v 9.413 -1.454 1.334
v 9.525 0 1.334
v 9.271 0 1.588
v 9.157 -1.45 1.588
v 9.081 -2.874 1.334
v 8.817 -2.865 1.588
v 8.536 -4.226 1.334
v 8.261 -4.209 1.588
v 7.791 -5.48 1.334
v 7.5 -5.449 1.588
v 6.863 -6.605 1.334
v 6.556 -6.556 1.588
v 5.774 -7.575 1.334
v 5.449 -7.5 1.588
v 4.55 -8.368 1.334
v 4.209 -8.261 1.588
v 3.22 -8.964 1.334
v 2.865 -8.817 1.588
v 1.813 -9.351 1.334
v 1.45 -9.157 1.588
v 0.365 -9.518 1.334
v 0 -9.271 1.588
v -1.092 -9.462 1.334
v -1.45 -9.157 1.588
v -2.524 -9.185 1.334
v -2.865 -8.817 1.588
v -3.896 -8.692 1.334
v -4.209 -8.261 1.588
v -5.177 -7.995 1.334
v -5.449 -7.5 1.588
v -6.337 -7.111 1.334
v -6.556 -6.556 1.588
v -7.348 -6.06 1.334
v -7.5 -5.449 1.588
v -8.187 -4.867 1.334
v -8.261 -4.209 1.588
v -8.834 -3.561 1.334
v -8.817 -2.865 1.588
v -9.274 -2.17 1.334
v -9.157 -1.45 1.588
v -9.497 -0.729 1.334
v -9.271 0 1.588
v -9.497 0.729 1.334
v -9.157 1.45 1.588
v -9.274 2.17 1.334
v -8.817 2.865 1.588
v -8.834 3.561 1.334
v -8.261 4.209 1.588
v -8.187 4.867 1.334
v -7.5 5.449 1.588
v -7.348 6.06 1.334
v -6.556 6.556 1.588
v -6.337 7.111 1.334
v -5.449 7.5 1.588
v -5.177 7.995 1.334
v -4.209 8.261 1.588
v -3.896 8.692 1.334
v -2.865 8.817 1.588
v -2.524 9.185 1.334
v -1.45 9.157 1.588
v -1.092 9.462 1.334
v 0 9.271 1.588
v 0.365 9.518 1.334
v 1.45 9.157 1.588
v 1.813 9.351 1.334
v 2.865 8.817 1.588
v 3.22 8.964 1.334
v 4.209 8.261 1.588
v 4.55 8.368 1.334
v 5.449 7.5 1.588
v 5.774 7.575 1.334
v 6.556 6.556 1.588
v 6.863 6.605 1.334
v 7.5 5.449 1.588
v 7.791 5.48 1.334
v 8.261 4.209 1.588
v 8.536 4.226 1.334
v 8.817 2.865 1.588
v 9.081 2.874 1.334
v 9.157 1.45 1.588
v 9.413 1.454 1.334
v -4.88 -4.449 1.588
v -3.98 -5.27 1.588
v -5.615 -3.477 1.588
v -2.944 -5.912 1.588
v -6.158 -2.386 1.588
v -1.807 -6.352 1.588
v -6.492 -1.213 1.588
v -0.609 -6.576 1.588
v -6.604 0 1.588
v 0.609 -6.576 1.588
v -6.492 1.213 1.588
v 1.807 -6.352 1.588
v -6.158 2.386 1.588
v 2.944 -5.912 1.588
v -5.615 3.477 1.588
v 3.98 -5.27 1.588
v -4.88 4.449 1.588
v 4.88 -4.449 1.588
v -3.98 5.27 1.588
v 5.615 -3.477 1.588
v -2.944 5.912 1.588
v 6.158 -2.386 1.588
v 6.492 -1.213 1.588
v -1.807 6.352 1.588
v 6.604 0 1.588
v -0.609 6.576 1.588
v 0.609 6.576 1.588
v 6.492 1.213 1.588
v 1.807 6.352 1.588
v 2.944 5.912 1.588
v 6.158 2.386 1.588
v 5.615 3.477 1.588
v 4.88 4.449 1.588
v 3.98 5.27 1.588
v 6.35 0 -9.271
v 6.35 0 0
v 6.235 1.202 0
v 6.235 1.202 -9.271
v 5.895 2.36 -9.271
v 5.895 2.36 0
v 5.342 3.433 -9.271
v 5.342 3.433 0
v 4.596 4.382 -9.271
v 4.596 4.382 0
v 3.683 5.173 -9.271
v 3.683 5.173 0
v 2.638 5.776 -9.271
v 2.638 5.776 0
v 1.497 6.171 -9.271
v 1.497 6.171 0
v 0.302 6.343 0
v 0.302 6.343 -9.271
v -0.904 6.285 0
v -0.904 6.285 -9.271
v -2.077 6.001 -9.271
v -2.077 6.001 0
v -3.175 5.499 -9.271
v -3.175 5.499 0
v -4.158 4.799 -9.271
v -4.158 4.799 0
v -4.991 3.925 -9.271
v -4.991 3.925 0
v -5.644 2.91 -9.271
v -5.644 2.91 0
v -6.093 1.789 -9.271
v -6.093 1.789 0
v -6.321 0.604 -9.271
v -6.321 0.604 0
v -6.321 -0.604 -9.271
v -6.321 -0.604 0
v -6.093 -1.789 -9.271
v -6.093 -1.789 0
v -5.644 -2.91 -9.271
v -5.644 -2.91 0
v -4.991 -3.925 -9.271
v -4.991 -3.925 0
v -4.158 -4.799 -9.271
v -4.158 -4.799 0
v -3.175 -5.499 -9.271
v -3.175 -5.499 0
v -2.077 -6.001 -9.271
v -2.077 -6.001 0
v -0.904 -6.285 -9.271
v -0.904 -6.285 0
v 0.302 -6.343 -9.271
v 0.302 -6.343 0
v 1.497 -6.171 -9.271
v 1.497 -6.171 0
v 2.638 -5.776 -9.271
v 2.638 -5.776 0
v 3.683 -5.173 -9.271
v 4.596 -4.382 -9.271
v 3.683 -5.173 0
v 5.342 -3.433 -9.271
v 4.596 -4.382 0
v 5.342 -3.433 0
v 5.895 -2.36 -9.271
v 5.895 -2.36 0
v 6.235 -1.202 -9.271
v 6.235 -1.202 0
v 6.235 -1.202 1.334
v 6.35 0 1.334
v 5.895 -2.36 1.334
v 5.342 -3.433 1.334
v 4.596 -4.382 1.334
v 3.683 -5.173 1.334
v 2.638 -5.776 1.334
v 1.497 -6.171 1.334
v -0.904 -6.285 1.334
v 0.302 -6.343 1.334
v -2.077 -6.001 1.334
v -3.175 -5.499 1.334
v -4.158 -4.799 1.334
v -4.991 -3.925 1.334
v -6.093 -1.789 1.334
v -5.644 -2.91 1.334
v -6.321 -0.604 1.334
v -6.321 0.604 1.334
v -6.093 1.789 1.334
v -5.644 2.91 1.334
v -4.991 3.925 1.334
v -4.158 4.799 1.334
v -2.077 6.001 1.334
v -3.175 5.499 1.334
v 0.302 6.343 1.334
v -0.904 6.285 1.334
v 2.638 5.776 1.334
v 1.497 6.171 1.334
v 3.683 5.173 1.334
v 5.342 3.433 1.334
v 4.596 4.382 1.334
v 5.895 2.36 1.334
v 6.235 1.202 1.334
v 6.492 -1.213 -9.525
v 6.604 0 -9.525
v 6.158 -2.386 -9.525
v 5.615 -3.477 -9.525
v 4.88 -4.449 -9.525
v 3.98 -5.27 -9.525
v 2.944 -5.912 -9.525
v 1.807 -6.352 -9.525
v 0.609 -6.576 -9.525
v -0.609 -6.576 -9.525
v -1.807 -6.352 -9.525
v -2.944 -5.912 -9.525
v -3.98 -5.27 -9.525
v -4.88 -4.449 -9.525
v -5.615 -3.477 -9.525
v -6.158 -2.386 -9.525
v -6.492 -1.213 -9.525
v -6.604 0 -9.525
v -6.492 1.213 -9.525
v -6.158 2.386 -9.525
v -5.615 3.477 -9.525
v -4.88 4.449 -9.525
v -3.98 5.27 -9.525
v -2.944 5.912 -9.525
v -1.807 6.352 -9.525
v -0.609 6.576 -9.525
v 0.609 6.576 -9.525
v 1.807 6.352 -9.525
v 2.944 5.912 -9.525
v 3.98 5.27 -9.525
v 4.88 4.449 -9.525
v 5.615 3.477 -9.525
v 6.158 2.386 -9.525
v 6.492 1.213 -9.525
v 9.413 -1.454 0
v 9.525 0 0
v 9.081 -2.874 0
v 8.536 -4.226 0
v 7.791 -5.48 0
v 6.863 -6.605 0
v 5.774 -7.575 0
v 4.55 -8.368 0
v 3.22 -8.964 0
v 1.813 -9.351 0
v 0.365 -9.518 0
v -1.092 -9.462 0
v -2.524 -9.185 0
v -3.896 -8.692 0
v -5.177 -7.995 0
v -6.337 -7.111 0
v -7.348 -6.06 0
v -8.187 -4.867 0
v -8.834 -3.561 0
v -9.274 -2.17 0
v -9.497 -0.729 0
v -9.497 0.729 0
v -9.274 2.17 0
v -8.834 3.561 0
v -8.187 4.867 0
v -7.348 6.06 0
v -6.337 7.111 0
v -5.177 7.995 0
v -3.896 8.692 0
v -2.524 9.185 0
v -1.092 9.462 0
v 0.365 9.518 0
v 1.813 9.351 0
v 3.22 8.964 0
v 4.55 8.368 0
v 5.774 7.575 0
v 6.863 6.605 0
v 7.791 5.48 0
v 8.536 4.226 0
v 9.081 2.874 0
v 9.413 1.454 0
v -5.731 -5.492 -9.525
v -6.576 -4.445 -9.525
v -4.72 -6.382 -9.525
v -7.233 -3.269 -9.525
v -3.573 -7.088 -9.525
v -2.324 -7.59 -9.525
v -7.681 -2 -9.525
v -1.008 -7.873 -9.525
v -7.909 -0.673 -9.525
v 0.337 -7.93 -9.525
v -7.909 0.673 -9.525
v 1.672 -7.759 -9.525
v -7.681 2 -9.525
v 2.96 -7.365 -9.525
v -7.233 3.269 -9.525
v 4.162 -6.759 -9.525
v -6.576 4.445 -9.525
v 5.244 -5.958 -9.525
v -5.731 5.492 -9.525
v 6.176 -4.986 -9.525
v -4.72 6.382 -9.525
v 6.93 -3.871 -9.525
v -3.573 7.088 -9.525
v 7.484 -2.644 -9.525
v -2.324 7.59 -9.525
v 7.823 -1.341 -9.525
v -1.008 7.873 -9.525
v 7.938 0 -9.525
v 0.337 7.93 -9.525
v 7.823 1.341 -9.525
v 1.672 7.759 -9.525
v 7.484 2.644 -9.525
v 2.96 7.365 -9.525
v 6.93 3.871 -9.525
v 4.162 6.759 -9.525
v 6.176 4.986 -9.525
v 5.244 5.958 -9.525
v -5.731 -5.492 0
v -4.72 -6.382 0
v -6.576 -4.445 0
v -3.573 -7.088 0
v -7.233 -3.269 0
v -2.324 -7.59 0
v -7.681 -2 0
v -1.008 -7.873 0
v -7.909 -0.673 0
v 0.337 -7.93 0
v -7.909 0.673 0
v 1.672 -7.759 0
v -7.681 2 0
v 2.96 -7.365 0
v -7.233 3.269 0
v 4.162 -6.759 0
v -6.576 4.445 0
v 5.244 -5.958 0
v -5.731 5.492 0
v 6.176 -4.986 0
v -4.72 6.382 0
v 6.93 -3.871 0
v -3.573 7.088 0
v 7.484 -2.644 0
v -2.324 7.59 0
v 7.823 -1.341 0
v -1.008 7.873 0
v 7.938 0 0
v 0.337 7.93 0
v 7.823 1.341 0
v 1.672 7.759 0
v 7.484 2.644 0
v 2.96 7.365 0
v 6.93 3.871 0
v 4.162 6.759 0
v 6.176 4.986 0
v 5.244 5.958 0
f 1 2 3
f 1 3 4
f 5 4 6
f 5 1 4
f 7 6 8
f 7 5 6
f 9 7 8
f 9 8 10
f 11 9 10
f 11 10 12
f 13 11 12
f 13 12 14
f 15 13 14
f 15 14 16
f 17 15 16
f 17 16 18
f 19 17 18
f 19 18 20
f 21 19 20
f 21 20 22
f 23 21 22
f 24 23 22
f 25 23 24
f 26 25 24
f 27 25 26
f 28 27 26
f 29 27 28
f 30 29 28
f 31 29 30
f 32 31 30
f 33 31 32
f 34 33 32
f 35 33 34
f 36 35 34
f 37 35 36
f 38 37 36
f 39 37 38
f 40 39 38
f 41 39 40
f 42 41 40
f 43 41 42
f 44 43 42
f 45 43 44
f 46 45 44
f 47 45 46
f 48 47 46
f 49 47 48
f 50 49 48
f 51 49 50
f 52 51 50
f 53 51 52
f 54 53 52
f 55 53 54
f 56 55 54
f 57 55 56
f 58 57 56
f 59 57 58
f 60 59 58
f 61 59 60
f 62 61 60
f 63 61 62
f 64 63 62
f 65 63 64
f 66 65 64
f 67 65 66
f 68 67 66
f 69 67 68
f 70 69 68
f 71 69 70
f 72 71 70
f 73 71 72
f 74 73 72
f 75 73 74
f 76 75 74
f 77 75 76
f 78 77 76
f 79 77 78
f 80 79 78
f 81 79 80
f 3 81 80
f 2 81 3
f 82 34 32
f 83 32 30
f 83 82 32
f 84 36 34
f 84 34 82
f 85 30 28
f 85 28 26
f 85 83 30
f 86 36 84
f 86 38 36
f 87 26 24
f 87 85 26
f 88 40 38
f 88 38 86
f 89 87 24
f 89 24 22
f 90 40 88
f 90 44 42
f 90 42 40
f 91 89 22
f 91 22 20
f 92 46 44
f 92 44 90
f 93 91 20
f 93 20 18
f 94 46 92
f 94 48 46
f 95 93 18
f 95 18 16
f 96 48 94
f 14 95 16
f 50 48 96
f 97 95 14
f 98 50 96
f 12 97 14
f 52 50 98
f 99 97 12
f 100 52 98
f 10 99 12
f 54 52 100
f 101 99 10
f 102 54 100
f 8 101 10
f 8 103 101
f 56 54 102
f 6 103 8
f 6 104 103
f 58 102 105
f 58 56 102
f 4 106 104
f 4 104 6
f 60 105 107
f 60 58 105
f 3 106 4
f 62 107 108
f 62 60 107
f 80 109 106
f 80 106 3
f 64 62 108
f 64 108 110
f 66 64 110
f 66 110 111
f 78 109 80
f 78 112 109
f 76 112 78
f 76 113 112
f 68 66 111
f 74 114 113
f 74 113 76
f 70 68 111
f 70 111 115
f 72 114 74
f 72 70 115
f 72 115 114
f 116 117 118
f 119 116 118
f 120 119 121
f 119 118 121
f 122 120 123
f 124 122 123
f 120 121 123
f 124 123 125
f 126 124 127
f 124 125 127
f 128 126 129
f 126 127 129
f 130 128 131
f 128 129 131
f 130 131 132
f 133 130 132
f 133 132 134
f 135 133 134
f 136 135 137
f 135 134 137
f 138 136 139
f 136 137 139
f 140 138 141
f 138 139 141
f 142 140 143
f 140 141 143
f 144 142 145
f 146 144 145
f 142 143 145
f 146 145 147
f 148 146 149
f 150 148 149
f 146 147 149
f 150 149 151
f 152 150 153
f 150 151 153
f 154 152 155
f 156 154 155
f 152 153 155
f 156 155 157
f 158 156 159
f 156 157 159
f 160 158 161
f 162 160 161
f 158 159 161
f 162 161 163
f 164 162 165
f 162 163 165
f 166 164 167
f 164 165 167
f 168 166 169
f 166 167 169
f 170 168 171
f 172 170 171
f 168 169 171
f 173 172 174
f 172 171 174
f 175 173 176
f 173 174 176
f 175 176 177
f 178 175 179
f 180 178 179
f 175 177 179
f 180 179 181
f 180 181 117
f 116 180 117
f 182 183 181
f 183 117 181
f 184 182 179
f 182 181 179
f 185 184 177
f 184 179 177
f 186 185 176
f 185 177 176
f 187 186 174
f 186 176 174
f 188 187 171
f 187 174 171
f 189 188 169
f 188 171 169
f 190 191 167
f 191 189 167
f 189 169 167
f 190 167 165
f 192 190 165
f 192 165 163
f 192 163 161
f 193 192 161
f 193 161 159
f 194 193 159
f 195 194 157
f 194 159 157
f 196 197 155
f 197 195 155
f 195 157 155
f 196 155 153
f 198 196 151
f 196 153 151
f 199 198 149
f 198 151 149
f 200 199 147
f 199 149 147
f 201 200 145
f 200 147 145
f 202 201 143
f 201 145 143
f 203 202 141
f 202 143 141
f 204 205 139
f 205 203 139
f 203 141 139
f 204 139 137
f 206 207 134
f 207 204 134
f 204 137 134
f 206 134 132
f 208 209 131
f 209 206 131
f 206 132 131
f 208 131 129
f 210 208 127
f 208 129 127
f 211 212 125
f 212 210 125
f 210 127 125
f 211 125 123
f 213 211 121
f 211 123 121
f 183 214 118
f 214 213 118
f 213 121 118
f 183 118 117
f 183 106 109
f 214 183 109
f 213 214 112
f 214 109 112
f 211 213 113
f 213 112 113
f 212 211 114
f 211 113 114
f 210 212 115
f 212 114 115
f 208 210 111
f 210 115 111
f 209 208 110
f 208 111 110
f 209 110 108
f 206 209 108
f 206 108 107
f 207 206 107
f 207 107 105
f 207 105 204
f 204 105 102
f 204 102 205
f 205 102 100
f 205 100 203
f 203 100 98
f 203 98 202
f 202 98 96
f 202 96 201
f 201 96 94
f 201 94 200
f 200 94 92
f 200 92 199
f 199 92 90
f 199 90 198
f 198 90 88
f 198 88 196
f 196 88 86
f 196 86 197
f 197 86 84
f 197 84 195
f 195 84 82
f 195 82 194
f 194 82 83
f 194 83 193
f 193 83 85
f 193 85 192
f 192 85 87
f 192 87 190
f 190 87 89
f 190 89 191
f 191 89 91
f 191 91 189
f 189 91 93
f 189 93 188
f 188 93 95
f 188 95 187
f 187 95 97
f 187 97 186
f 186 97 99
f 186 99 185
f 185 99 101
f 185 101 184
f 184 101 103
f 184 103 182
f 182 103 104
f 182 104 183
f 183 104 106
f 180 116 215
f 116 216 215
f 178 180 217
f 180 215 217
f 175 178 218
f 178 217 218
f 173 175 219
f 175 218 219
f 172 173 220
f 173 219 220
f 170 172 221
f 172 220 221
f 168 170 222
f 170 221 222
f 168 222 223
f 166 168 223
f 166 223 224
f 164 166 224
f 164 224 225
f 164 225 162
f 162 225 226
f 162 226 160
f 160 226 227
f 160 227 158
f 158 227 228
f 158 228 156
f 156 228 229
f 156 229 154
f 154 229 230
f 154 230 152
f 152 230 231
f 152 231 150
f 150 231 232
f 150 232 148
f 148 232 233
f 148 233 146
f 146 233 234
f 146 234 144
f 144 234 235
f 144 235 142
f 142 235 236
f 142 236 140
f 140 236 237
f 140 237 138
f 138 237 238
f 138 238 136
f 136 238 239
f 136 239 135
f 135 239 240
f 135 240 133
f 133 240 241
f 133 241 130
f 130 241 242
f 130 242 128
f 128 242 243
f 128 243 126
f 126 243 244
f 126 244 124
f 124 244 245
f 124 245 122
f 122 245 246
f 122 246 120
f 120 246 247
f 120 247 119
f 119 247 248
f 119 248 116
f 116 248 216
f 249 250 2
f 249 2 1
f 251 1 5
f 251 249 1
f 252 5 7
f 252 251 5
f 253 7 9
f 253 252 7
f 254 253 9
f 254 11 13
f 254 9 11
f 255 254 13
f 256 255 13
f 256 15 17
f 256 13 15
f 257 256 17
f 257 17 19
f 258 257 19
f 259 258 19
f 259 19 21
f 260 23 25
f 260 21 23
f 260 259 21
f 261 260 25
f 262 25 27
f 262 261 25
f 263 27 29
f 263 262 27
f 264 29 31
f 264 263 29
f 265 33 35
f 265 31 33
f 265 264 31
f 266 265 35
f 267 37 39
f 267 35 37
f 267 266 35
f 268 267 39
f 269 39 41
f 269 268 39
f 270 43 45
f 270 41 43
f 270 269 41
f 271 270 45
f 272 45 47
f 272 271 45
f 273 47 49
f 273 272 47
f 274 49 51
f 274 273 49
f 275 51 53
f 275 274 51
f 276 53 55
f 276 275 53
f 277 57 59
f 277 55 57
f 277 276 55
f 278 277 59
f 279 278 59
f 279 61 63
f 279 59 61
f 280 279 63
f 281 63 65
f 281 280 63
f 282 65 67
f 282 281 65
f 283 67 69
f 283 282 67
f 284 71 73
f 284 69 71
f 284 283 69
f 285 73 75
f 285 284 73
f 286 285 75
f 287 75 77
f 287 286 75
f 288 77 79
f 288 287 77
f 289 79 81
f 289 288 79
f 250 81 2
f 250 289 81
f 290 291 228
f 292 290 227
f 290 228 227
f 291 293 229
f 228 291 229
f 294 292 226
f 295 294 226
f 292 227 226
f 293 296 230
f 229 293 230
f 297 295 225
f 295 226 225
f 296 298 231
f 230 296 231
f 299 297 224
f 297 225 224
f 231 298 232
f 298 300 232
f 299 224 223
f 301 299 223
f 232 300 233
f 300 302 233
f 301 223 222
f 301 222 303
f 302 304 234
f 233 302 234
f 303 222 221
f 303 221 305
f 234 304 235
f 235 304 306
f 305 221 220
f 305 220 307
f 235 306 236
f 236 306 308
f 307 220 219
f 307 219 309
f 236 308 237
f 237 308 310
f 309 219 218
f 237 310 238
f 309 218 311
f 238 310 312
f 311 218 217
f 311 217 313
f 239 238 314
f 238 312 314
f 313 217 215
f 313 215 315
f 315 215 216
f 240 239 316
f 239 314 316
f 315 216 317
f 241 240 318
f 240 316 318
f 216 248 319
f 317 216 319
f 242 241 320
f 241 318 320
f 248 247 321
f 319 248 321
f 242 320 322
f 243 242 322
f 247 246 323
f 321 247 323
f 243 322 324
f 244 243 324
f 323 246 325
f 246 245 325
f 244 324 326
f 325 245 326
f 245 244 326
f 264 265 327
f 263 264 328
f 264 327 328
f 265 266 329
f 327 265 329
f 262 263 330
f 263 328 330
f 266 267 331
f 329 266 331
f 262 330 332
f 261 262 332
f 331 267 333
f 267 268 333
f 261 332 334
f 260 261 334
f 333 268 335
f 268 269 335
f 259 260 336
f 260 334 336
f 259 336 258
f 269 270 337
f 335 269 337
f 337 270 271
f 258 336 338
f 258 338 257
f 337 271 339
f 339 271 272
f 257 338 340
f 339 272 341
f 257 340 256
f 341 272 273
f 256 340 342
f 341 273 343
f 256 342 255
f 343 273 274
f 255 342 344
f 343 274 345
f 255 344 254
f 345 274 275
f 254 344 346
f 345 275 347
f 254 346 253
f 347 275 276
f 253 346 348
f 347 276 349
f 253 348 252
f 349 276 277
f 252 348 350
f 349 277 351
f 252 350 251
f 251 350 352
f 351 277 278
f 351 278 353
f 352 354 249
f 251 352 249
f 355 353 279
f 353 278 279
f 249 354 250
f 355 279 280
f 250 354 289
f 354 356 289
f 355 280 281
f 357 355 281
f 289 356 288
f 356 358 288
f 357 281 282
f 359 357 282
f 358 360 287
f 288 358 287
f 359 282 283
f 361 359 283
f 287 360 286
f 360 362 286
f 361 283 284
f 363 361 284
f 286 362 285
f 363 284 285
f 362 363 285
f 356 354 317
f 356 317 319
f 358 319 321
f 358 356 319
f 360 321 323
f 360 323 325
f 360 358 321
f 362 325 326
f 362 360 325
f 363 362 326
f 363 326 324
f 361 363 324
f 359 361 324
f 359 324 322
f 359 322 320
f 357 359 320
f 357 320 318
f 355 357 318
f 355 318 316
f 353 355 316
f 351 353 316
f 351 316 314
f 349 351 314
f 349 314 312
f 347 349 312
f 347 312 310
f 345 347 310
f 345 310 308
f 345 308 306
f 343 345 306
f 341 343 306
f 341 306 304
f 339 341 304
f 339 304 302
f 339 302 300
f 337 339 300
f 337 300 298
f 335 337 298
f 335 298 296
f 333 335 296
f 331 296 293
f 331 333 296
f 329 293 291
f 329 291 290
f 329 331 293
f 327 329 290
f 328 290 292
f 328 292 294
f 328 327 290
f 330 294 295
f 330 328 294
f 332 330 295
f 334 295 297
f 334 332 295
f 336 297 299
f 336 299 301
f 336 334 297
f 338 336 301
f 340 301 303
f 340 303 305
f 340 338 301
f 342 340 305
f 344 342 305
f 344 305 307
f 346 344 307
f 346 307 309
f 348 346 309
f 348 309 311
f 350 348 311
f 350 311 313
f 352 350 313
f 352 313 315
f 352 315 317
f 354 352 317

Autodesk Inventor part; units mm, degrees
ref_plane "YZ Plane" through (0, 0, 0) normal (1, 0, 0) x (0, 1, 0)
ref_plane "XZ Plane" through (0, 0, 0) normal (0, 1, 0) x (-1, 0, 0)
ref_plane "XY Plane" through (0, 0, 0) normal (0, 0, 1) x (1, 0, 0)
sketch "Sketch1" plane through (0, 0, 0) normal (0, 0, 1) x (1, 0, 0)
  circle A0 centre (0, 0) radius 6.35
  circle A1 centre (0, 0) radius 7.9375
  circle A2 centre (0, 0) radius 9.525
  dimension "d0" = 12.7
  dimension "d1" = 15.875
  dimension "d2" = 19.05
extrude "Extrusion1" add sketch "Sketch1" against normal blind 9.525 contours A1
extrude "Extrusion2" add sketch "Sketch1" along normal blind 1.5875 contours A1 | A2
chamfer "Chamfer1" distance 0.254 angle 45 3 edges at (-9.525, 0, 1.5875) (-6.35, 0, 1.5875) (-6.35, 0, -9.525)
properties part number "Chassis_Washer_AndyMark_am-0947" material "Nylon-6/6"
